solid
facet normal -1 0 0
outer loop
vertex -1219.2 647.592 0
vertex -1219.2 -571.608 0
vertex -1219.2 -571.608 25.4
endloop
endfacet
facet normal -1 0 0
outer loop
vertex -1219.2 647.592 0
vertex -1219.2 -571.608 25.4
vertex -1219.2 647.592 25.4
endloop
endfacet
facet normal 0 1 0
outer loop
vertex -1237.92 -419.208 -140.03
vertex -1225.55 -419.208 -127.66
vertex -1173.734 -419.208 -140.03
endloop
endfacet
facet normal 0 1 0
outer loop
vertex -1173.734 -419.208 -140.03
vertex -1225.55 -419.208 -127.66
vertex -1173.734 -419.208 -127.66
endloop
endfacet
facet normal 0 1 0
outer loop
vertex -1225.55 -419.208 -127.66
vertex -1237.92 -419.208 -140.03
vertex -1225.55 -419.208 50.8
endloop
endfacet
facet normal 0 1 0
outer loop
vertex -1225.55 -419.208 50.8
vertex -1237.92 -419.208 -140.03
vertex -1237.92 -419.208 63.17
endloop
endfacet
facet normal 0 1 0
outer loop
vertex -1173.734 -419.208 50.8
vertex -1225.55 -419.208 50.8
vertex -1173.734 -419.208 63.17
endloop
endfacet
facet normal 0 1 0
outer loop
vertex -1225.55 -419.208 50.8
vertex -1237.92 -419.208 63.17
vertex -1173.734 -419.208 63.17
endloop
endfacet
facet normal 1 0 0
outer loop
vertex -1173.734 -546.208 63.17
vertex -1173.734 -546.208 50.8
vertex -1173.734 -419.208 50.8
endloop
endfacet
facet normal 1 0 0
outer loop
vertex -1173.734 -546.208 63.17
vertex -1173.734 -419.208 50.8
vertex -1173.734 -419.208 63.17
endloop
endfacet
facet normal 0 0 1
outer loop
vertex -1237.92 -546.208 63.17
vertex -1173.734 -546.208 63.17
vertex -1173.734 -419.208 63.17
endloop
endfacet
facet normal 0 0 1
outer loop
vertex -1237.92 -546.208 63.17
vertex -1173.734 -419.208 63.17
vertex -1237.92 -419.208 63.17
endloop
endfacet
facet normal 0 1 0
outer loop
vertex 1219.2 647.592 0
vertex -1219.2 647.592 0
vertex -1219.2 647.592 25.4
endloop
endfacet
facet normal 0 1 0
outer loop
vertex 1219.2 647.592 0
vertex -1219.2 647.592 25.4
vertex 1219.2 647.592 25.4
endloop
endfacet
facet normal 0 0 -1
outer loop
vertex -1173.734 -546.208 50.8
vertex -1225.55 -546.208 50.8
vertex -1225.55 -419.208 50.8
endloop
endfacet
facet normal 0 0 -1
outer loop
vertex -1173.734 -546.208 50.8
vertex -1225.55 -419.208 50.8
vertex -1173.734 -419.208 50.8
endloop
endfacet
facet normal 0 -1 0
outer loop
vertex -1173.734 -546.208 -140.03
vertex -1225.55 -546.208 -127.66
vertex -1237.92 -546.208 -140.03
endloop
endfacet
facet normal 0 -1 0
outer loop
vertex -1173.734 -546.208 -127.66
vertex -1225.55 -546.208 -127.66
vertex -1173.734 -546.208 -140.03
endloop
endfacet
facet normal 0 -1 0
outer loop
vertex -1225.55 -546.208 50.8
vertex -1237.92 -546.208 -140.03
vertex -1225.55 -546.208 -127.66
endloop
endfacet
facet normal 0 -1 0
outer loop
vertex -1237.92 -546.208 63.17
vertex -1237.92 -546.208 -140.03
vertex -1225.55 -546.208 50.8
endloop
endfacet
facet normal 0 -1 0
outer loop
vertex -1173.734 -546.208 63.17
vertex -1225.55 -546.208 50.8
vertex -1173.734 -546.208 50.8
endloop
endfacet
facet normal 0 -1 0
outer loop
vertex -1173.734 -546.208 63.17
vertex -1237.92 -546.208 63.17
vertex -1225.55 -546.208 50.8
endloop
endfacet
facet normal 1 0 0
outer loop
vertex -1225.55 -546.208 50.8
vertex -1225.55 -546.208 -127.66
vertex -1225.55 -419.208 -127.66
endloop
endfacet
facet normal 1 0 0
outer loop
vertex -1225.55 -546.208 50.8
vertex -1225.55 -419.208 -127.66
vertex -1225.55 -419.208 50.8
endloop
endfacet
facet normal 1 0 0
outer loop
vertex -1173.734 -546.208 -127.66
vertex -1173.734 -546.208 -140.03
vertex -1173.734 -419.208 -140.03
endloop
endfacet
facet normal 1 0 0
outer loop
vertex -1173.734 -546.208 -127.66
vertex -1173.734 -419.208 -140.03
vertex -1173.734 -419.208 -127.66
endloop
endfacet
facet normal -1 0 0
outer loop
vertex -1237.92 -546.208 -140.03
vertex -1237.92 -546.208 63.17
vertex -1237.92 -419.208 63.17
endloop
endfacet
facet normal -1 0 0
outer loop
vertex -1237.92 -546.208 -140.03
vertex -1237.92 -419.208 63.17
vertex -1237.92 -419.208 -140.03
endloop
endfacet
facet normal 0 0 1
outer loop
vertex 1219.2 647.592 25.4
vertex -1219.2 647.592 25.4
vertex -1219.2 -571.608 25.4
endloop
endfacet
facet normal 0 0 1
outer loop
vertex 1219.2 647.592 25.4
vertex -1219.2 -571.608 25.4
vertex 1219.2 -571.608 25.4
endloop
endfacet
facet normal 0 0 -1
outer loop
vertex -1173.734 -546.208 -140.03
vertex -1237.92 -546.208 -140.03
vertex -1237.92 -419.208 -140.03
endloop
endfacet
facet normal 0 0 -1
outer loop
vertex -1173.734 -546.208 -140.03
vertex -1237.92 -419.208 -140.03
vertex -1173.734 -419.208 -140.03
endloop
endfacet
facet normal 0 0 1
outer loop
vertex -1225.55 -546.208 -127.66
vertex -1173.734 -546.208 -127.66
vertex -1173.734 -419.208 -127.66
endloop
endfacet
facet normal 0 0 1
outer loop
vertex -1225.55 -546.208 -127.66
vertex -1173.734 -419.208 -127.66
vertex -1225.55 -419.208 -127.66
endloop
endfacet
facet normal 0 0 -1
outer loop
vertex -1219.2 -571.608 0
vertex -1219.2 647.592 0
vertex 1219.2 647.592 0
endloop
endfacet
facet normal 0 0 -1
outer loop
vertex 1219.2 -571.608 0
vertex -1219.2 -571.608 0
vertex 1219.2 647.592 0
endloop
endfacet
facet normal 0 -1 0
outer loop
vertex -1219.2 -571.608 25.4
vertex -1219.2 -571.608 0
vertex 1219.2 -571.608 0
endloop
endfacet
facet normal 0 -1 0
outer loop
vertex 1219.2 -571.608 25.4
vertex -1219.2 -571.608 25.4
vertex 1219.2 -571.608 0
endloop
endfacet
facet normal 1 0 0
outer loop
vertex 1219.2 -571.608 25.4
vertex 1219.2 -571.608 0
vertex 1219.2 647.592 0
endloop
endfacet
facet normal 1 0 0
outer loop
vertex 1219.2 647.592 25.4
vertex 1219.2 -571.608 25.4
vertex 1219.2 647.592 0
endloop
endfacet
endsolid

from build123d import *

# Parameters (mm, degrees)
F0_W     = 2438.4
F0_H     = 1219.2
F1_DEPTH = 25.4
F4_DEPTH = 127


with BuildPart() as f1:
    # F0 (on Top) → F1 (new body)
    with BuildSketch(Plane.XY):
        with Locations((0, 37.9918139073)):
            Rectangle(F0_W, F0_H)
    extrude(amount=F1_DEPTH)


with BuildPart() as f4:
    # F3 (on offset) → F4 (new body)
    with BuildSketch(Plane.XZ.offset(546.2081860927)):
        Polygon((-1225.55, 63.1698), (-1237.9198, 63.1698), (-1237.9198, -8.0521171277), (-1237.9198, -127.6604), (-1237.9198, -140.0302), (-1225.55, -140.0302), (-1173.734, -140.0302), (-1173.734, -127.6604), (-1225.55, -127.6604), (-1225.55, 50.8), (-1173.734, 50.8), (-1173.734, 63.1698), align=None)
    extrude(amount=-F4_DEPTH)


solid = Compound([f1.part, f4.part])
